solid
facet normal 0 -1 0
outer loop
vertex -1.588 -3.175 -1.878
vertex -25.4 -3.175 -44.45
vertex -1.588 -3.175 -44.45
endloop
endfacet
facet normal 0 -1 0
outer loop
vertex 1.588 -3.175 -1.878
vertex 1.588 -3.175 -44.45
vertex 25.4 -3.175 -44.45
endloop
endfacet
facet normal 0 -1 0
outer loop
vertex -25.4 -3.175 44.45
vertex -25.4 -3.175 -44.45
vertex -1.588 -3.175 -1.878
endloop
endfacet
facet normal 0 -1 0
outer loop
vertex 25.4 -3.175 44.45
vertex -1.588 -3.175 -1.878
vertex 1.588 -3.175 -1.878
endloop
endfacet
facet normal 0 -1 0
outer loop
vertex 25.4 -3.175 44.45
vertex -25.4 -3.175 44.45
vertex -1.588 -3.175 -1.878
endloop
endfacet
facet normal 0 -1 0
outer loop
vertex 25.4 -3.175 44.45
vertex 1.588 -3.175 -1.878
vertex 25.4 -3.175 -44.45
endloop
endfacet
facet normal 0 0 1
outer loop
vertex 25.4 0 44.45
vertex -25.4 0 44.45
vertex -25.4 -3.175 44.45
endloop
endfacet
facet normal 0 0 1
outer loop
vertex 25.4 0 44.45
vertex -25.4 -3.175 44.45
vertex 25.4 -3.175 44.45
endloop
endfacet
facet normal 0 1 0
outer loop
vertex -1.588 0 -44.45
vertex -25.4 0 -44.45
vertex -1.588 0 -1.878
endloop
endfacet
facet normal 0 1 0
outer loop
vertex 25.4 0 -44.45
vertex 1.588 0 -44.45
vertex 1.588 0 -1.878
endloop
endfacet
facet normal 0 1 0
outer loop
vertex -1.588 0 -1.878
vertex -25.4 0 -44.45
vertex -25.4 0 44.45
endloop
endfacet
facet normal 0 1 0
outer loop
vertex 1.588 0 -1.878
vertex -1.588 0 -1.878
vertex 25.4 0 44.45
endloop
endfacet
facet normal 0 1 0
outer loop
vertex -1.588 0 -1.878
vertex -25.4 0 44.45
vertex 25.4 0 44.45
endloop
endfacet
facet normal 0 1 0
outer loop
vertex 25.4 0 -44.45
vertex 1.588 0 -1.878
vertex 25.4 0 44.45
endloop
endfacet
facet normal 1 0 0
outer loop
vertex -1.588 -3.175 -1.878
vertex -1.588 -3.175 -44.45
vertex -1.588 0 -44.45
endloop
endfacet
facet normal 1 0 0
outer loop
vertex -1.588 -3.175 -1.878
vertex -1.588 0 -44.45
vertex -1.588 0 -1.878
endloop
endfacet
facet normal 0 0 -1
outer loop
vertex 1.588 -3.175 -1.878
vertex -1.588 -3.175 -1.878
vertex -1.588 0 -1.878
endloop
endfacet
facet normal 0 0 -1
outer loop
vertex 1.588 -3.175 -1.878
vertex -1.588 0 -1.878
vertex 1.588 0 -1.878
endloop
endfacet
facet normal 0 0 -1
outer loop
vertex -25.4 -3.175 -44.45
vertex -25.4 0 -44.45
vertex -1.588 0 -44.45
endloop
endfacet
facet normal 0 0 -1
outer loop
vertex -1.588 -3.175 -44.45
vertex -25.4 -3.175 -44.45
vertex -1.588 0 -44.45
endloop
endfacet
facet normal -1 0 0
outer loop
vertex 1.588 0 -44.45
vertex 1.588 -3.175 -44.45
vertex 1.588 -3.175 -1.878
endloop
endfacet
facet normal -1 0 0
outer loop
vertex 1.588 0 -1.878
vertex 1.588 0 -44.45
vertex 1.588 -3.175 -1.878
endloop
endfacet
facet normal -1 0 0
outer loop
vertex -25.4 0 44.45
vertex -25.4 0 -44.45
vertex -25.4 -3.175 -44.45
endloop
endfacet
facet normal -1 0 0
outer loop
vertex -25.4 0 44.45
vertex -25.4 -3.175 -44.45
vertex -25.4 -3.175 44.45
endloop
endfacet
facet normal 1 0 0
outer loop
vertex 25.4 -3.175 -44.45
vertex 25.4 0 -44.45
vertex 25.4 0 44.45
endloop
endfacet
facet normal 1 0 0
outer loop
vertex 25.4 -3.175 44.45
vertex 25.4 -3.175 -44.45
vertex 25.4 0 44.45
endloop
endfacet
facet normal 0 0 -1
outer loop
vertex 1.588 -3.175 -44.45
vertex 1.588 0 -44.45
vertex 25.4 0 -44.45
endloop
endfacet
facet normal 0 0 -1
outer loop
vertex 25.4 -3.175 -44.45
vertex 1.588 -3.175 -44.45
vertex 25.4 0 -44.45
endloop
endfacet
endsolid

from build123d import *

# Parameters (mm, degrees)
F0_W     = 50.8
F0_H     = 88.9
F1_DEPTH = 3.175
F2_W     = 3.175
F2_H     = 42.8625
F3_DEPTH = 3.175
F4_DEPTH = 3.175


with BuildPart() as f1:
    # F0 (on Front) → F1 (new body)
    with BuildSketch(Plane.XZ):
        Rectangle(F0_W, F0_H)
    extrude(amount=F1_DEPTH)

    # F2 (on face) → F3 (cut)
    with BuildSketch(Plane.XZ.offset(3.175)):
        with Locations((0, -23.309385)):
            Rectangle(F2_W, F2_H)
    extrude(amount=-F3_DEPTH, mode=Mode.SUBTRACT)

    # F2 (on face) → F4 (cut)
    with BuildSketch(Plane.XZ.offset(3.175)):
        with Locations((0, -23.309385)):
            Rectangle(F2_W, F2_H)
    extrude(amount=-F4_DEPTH, mode=Mode.SUBTRACT)


solid = f1.part
